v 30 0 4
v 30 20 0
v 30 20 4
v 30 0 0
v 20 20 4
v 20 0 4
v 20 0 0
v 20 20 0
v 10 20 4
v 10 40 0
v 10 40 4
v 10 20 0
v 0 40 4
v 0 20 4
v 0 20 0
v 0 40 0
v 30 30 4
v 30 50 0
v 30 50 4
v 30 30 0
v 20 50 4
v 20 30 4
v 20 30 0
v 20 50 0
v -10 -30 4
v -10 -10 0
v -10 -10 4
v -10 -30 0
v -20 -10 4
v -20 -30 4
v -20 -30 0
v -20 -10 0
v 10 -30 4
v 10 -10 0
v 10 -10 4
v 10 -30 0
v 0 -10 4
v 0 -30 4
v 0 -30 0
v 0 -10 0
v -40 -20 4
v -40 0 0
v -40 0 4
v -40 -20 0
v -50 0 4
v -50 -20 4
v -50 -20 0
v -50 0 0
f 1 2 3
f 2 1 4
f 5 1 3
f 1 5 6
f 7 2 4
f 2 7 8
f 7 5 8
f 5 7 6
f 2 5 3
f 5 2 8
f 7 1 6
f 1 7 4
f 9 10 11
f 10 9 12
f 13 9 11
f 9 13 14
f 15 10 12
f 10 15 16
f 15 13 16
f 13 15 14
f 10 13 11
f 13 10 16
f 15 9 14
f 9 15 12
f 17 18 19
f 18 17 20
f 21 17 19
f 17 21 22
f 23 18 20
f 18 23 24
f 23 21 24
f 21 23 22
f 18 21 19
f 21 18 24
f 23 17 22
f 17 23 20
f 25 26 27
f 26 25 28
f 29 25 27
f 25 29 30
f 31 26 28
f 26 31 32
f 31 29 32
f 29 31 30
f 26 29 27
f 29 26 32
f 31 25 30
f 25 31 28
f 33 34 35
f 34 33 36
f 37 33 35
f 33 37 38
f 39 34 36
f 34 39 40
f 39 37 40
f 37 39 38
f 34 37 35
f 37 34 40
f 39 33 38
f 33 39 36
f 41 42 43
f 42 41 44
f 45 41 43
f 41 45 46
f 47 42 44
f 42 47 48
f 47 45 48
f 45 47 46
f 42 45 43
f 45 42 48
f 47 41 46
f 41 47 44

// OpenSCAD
module MoveChain(){
  union(){
    translate([20, 0, 0])color("red")cube([10, 20, 4]);
    translate([0, 10, 0])translate([0, 10, 0])color("orangered")cube([10, 20, 4]);
    translate([20, 30, 0])color("orange")cube([10, 20, 4]);
    translate([0, -10, 0])translate([-20, -20, 0])color("yellow")cube([10, 20, 4]);
    translate([0, -10, 0])translate([0, -20, 0])color("blue")cube([10, 20, 4]);
    translate([0, 20, 0])translate([0, -50, 0])color("navy")cube([10, 20, 4]);
    translate([0, -20, 0])translate([-50, 0, 0])color("purple")cube([10, 20, 4]);
  }
}
$fn=64;
MoveChain();
